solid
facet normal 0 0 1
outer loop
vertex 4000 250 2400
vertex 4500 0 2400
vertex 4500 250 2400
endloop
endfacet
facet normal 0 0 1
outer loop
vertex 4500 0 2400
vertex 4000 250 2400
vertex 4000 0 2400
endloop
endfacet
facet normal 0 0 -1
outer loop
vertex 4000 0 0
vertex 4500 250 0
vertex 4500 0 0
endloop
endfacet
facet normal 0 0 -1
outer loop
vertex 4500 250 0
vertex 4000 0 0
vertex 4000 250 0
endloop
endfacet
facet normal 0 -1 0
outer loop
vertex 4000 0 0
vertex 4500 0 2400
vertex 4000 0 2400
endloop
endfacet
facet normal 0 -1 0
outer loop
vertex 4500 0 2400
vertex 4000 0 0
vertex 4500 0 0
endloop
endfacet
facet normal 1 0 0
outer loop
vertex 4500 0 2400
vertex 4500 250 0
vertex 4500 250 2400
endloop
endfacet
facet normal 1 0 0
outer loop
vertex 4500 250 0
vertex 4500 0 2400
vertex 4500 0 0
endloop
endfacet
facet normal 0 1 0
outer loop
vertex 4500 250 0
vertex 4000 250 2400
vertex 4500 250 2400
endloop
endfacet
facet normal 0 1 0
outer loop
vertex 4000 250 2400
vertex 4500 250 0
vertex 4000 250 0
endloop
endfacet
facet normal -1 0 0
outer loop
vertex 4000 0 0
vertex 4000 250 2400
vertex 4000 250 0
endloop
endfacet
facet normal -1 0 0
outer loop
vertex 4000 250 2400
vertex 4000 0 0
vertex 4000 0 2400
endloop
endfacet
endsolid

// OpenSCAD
// file: tea_shop_parameters.scad
// =============================================================================
// Tea Shop — SHARED PARAMETERS (Base & Shell)
// -----------------------------------------------------------------------------
// OpenSCAD's native unit is 1 mm, so every value here is the REAL-LIFE size
// in millimetres (1000 mm = 1 m). E.g. building_width = 6000 means 6.0 m.
//
// For MLO / FiveM (which uses metres as 1 unit = 1 m), either:
//   (a) export each STL here and re-import at a scale of 0.001 (mm -> m), or
//   (b) model in metres directly by dividing every value below by 1000.
//
// Tune each value here; every module pulls its size from these variables.
// =============================================================================


// --- building shell / roof (lean-to: TALL back, SHORT front eave) -----------
wall_thickness    = 250;   // wall panel thickness                      (0.25 m)
building_width    = 6000;  // X extent, left wall -> right wall          (6.00 m)
building_depth    = 4000;  // Y extent, front eave -> back wall          (4.00 m)
back_height       = 3200;  // full wall height at the BACK (tall side)   (3.20 m)
front_eave_height = 2400;  // wall height at the FRONT eave (short side) (2.40 m)

// --- front wall openings (service window + door), measured along X ----------
left_pier_width   = 600;   // solid pier left of the service window      (0.60 m)
window_width      = 3400;  // service window opening width — made WIDE   (3.40 m)
mid_pier_width    = 500;   // solid pier between window and door         (0.50 m)
door_width        = 1000;  // door opening width                         (1.00 m)
sill_height       = 900;   // knee-wall (sill) height beneath the window (0.90 m)

// --- base slab / plinth ------------------------------------------------------
base_thickness    = 200;   // vertical thickness of the ground plinth    (0.20 m)
base_side_margin  = 900;   // slab overhang beyond left/right walls      (0.90 m)
base_back_margin  = 600;   // slab overhang behind the back wall         (0.60 m)
base_front_margin = 3000;  // extra slab in FRONT = porch/patio (pergola)(3.00 m)


// -----------------------------------------------------------------------------
// DERIVED DIMENSIONS (do not edit — computed from the values above)
// -----------------------------------------------------------------------------

// front-wall pier chain, left -> right, must sum exactly to building_width
window_left      = left_pier_width;                    // X where the window starts
window_right     = window_left + window_width;         // X where the window ends
door_left        = window_right + mid_pier_width;      // X where the door starts
door_right       = door_left + door_width;             // X where the door ends
right_pier_width = building_width - door_right;        // fills the rest to the corner

// window opening rises from the top of the sill up to the front eave line
window_open_height = front_eave_height - sill_height;
// file: tea_shop_modules.scad
// =============================================================================
// Tea Shop — MODULE LIBRARY (Base & Shell)
// -----------------------------------------------------------------------------
// This file only DEFINES the parts (and the assemble() preview). It instantiates
// NO geometry on its own, so it can be include'd by the individual export files
// (part_*.scad) and by tea_shop_assemble.scad without producing duplicates.
//
// GLOBAL COORDINATE SYSTEM (shared by every piece — no per-part centering):
//   +X -> left -> right  (building WIDTH along X, left wall at X=0)
//   +Y -> front -> back  (building DEPTH along Y, front eave at Y=0)
//   +Z -> up             (ground/porch surface = Z=0)
//
//   Building footprint = [0..building_width] x [0..building_depth].
//   Roof = single-pitch lean-to: TALL at BACK (Y=depth), SHORT at FRONT (Y=0).
// =============================================================================

include <tea_shop_parameters.scad>;


// -----------------------------------------------------------------------------
// _trapezoid_prism — shared core for the two side walls. It draws the side
// elevation (depth x height) as a 2D polygon, then linear_extrude +
// rotate([0,-90,0]) stand it up so its thickness runs along X. The front edge
// (Y=0) is the short eave height and the back edge (Y=depth) is the full back
// height, so the top edge automatically matches the roof pitch. Result
// occupies X = [0 .. wall_thickness].
// -----------------------------------------------------------------------------
module _trapezoid_prism() {
    translate([wall_thickness, 0, 0])
        rotate([0, -90, 0])
            linear_extrude(height = wall_thickness)
                polygon(points = [
                    [0,                 0],               // front, ground
                    [0,                 building_depth],  // back,  ground
                    [back_height,       building_depth],  // back,  top (tall)
                    [front_eave_height, 0]                // front, top (eave)
                ]);
}


// =============================================================================
// base_slab — flat ground plinth. Extends past the building on all sides, with
// a generous margin up front to form the porch/patio where the bench / stools
// sit under the pergola. Top surface is the datum Z=0.
// =============================================================================
module base_slab() {
    translate([-base_side_margin, -base_front_margin, -base_thickness])
        cube([
            building_width + 2 * base_side_margin,                 // X
            building_depth + base_front_margin + base_back_margin, // Y
            base_thickness                                          // Z
        ]);
}


// =============================================================================
// back_wall — solid rectangular panel, full building width and FULL height
// (the tall side of the lean-to). Sits at the back edge of the footprint.
// =============================================================================
module back_wall() {
    translate([0, building_depth - wall_thickness, 0])
        cube([building_width, wall_thickness, back_height]);
}


// =============================================================================
// left_side_wall — trapezoidal panel, TALL at the back edge and SHORT at the
// front edge, matching the roof slope. Occupies X = [0 .. wall_thickness].
// =============================================================================
module left_side_wall() {
    _trapezoid_prism();
}


// =============================================================================
// right_side_wall — mirror image of the left wall (identical trapezoid cross
// section, since both walls slope down toward the FRONT eave), placed at the
// right edge X = [building_width - wall_thickness .. building_width].
// Plain — no openings.
// =============================================================================
module right_side_wall() {
    translate([building_width - wall_thickness, 0, 0])
        _trapezoid_prism();
}


// =============================================================================
// FRONT WALL — broken into solid piers + a knee-wall (sill), leaving a service
// window opening and a door opening. Every front piece tops out at the front
// eave height (the horizontal line where the roof meets the front wall).
//
//   |<- left ->|<--- window --->|<- mid ->|<-- door -->|<- right ->|
//   |   pier   |    (opening)   |   pier  |  (opening)  |   pier   |
//   |          |   [sill below] |         |             |          |
// =============================================================================

// front_wall_left_pier — solid pier left of the service window, ground to eave.
module front_wall_left_pier() {
    translate([0, 0, 0])
        cube([left_pier_width, wall_thickness, front_eave_height]);
}


// front_wall_sill — the low knee-wall beneath the service window opening.
// The window opening sits above it.
// TODO: counter + window frame modules slot in above this sill (later group).
module front_wall_sill() {
    translate([window_left, 0, 0])
        cube([window_width, wall_thickness, sill_height]);
}


// front_wall_mid_pier — solid pier between the window and the door, full height.
module front_wall_mid_pier() {
    translate([window_right, 0, 0])
        cube([mid_pier_width, wall_thickness, front_eave_height]);
}


// front_wall_right_pier — solid pier right of the door, out to the front corner.
// Width is derived so the pier chain always ends flush with the right corner.
module front_wall_right_pier() {
    translate([door_right, 0, 0])
        cube([right_pier_width, wall_thickness, front_eave_height]);
}


// -----------------------------------------------------------------------------
// OPENING ANNOTATIONS (for reference — these are EMPTY volumes in the shell):
//
//   Service window opening:
//     X = [window_left .. window_right], Z = [sill_height .. front_eave_height]
//     TODO: window frame + service counter modules slot in here (later group).
//
//   Door opening:
//     X = [door_left .. door_right], Z = [0 .. front_eave_height] (full height)
//     TODO: door / door-frame module slots in here (later group).
// -----------------------------------------------------------------------------


// =============================================================================
// assemble — visual verification ONLY (not for export). Shows every piece in
// the shared coordinate system, each in its own colour, so the assembled shell
// can be checked against the reference before exporting individual STLs.
// =============================================================================
module assemble() {
    color("LightGray")  base_slab();

    color("SkyBlue")    back_wall();
    color("Orange")     left_side_wall();
    color("Orange")     right_side_wall();

    color("FireBrick")  front_wall_left_pier();
    color("Peru")       front_wall_sill();
    color("FireBrick")  front_wall_mid_pier();
    color("FireBrick")  front_wall_right_pier();
}
// main file
// =============================================================================
// part_front_wall_mid_pier.scad — export the FRONT WALL MID PIER only.
// Open this file, press F6 (render), then export as STL. Everything sits in the
// shared global coordinate system, so re-importing all parts together lines up
// automatically with no manual repositioning.
// =============================================================================

include <tea_shop_modules.scad>;

front_wall_mid_pier();
